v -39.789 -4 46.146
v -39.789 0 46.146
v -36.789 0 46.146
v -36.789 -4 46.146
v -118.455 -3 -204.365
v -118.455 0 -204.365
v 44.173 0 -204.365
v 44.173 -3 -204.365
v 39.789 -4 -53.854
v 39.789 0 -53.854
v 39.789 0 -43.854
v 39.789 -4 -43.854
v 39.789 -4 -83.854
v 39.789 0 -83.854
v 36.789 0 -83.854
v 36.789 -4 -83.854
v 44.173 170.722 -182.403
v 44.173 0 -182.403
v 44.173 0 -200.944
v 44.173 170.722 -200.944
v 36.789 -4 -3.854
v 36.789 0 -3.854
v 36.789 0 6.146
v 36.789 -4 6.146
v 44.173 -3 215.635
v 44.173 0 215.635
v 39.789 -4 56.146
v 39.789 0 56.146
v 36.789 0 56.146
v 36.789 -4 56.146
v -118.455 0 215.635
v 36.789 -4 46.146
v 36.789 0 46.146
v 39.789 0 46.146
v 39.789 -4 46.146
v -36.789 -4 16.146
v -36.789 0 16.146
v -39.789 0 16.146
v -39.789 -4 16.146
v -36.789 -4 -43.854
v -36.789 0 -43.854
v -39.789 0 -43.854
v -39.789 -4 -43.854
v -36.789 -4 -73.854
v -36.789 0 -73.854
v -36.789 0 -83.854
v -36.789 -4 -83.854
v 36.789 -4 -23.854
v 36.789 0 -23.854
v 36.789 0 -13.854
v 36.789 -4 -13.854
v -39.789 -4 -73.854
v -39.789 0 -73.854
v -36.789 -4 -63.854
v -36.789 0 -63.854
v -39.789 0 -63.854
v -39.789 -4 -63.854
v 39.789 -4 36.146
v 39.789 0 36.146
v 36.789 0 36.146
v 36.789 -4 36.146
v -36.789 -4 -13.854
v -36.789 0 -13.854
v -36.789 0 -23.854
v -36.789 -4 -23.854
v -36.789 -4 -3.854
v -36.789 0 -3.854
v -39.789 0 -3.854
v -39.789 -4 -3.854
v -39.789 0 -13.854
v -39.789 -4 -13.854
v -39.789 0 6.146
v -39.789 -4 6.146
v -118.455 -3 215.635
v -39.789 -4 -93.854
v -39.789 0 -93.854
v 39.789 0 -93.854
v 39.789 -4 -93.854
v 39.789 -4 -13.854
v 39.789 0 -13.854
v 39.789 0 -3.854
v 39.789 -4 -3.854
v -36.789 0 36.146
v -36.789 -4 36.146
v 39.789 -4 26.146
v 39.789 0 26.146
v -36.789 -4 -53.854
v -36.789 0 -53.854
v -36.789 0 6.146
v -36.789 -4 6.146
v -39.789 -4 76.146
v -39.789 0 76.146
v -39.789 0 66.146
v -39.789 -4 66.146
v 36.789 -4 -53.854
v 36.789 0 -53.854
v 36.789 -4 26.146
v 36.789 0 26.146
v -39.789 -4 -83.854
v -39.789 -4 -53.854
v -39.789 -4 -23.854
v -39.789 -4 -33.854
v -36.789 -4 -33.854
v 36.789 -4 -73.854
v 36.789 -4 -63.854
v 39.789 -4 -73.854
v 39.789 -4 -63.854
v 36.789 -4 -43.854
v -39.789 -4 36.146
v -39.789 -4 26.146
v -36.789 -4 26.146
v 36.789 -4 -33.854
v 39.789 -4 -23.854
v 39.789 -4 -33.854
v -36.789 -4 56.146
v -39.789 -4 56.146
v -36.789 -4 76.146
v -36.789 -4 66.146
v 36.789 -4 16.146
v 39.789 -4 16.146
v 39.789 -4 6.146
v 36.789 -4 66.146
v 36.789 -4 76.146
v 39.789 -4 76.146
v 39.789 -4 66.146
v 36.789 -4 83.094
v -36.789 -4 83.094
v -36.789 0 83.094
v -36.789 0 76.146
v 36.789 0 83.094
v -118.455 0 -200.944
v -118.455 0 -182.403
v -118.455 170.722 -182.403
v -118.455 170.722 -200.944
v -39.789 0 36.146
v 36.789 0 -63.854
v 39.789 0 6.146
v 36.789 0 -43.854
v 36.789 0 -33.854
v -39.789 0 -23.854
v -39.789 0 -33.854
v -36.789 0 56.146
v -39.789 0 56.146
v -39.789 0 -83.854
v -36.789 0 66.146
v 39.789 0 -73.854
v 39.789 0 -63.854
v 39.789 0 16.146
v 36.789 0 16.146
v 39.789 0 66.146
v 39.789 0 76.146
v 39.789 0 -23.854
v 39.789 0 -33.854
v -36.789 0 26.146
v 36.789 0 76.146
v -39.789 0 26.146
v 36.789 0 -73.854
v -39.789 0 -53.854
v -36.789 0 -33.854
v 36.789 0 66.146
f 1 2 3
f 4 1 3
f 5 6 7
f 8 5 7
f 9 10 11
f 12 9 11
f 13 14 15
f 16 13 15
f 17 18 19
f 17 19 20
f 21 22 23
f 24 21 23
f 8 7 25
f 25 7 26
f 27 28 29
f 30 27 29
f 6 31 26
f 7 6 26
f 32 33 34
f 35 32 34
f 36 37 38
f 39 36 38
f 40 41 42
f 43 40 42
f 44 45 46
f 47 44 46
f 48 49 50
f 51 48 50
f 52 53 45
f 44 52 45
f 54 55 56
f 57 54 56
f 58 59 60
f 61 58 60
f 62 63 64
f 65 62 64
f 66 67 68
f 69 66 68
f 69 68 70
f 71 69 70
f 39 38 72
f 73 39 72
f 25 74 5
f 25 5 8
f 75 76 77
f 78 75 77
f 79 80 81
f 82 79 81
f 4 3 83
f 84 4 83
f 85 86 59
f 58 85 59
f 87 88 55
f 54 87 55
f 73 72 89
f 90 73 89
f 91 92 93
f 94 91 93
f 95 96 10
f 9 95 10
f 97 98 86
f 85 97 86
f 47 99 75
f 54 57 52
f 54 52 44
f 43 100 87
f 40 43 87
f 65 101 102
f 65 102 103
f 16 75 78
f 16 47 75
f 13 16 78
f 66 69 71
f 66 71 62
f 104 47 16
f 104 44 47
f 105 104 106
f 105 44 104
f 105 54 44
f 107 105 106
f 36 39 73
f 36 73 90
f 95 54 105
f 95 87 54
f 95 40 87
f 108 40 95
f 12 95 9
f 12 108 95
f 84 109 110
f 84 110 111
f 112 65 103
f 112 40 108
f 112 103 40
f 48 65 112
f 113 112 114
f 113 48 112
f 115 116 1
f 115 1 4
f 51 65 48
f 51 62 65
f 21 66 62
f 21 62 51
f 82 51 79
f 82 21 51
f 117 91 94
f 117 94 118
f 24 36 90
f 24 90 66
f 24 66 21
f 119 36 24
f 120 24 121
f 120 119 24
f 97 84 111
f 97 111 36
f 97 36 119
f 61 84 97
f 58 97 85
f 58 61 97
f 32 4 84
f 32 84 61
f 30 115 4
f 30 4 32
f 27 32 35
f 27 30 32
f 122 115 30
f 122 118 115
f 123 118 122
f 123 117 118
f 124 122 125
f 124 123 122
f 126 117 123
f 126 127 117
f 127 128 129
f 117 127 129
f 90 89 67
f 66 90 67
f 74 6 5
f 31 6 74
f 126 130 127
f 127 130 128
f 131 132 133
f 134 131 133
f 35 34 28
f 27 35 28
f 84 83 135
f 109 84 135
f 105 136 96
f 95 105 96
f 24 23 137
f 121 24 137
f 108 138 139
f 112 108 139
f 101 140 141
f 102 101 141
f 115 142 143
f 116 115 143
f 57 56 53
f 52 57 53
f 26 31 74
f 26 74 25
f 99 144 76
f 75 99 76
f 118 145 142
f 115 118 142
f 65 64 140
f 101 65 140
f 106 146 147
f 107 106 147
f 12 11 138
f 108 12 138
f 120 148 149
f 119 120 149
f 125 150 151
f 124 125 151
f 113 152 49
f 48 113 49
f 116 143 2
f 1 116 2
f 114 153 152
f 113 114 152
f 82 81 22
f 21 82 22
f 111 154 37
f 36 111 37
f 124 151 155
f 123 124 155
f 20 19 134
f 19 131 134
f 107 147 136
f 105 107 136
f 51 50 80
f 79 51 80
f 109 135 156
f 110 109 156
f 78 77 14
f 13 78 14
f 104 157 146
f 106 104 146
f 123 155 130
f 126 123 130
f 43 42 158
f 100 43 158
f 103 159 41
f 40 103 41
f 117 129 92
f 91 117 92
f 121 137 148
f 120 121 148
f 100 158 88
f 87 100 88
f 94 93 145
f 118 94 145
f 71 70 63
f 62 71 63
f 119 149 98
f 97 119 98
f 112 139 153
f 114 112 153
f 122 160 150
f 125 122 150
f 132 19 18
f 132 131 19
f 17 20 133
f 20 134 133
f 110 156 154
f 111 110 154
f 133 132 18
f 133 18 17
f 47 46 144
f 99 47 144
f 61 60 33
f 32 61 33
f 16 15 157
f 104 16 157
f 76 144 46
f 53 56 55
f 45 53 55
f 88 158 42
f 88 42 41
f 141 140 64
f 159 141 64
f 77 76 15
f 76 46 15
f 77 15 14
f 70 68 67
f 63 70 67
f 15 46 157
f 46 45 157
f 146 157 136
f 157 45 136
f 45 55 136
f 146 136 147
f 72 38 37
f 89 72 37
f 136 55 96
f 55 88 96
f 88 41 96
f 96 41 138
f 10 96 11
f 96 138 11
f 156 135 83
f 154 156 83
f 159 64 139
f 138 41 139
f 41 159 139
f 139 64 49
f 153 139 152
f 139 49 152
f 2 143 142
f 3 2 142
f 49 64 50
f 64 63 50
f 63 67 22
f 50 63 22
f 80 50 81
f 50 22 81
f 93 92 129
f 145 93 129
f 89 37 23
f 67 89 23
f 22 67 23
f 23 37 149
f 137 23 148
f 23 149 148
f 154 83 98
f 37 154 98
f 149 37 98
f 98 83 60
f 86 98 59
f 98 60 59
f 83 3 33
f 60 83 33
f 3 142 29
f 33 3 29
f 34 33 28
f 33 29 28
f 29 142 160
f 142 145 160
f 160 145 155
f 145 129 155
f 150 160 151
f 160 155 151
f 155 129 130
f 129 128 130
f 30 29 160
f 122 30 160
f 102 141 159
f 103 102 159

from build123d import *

# Parameters (mm, degrees)
F0_W     = 162.62761
F0_H     = 420
F1_DEPTH = 3
F2_W     = 170.722424984
F2_H     = 18.5404643416
F3_DEPTH = 118.454916951
F4_DEPTH = 44.172693049
F6_DEPTH = 4


# Not quite as in the source:
# - a feature of the source that left no trace in its solid (it failed there, or was rolled back) is left out


with BuildPart() as f1:
    # F0 (on Front) → F1 (new body)
    with BuildSketch(Plane.XZ):
        with Locations((-37.141111951, 5.6345053017)):
            Rectangle(F0_W, F0_H)
    extrude(amount=F1_DEPTH)


with BuildPart() as f3:
    # F2 (on Right) → F3 (new body, through all)
    with BuildSketch(Plane.YZ):
        with Locations((85.361212492, -191.6734613478)):
            Rectangle(F2_W, F2_H)
    extrude(amount=-F3_DEPTH)

    # F4 (add, through all): a face of the model
    f4_faces = [f3.faces().sort_by_distance(p)[0] for p in [
        (0, 85.361212492, -191.6734613478),
    ]]
    extrude(f4_faces, amount=F4_DEPTH)


with BuildPart() as f6:
    # F5 (on Front) → F6 (new body)
    with BuildSketch(Plane.XZ):
        Polygon((-39.788750782, -83.8537883393), (-39.788750782, -93.8537883393), (39.788750782, -93.8537883393), (39.788750782, -83.8537883393), (36.788750782, -83.8537883393), (36.788750782, -73.8537883393), (39.788750782, -73.8537883393), (39.788750782, -63.8537883393), (36.788750782, -63.8537883393), (36.788750782, -53.8537883393), (39.788750782, -53.8537883393), (39.788750782, -43.8537883393), (36.788750782, -43.8537883393), (36.788750782, -33.8537883393), (39.788750782, -33.8537883393), (39.788750782, -23.8537883393), (36.788750782, -23.8537883393), (36.788750782, -13.8537883393), (39.788750782, -13.8537883393), (39.788750782, -3.8537883393), (36.788750782, -3.8537883393), (36.788750782, 6.1462116607), (39.788750782, 6.1462116607), (39.788750782, 16.1462116607), (36.788750782, 16.1462116607), (36.788750782, 26.1462116607), (39.788750782, 26.1462116607), (39.788750782, 36.1462116607), (36.788750782, 36.1462116607), (36.788750782, 46.1462116607), (39.788750782, 46.1462116607), (39.788750782, 56.1462116607), (36.788750782, 56.1462116607), (36.788750782, 66.1462116607), (39.788750782, 66.1462116607), (39.788750782, 76.1462116607), (36.788750782, 76.1462116607), (36.788750782, 83.0940887698), (-36.788750782, 83.0940887698), (-36.788750782, 76.1462116607), (-39.788750782, 76.1462116607), (-39.788750782, 66.1462116607), (-36.788750782, 66.1462116607), (-36.788750782, 56.1462116607), (-39.788750782, 56.1462116607), (-39.788750782, 46.1462116607), (-36.788750782, 46.1462116607), (-36.788750782, 36.1462116607), (-39.788750782, 36.1462116607), (-39.788750782, 26.1462116607), (-36.788750782, 26.1462116607), (-36.788750782, 16.1462116607), (-39.788750782, 16.1462116607), (-39.788750782, 6.1462116607), (-36.788750782, 6.1462116607), (-36.788750782, -3.8537883393), (-39.788750782, -3.8537883393), (-39.788750782, -13.8537883393), (-36.788750782, -13.8537883393), (-36.788750782, -23.8537883393), (-39.788750782, -23.8537883393), (-39.788750782, -33.8537883393), (-36.788750782, -33.8537883393), (-36.788750782, -43.8537883393), (-39.788750782, -43.8537883393), (-39.788750782, -53.8537883393), (-36.788750782, -53.8537883393), (-36.788750782, -63.8537883393), (-39.788750782, -63.8537883393), (-39.788750782, -73.8537883393), (-36.788750782, -73.8537883393), (-36.788750782, -83.8537883393), align=None)
    extrude(amount=F6_DEPTH)


solid = Compound([f1.part, f3.part, f6.part])
